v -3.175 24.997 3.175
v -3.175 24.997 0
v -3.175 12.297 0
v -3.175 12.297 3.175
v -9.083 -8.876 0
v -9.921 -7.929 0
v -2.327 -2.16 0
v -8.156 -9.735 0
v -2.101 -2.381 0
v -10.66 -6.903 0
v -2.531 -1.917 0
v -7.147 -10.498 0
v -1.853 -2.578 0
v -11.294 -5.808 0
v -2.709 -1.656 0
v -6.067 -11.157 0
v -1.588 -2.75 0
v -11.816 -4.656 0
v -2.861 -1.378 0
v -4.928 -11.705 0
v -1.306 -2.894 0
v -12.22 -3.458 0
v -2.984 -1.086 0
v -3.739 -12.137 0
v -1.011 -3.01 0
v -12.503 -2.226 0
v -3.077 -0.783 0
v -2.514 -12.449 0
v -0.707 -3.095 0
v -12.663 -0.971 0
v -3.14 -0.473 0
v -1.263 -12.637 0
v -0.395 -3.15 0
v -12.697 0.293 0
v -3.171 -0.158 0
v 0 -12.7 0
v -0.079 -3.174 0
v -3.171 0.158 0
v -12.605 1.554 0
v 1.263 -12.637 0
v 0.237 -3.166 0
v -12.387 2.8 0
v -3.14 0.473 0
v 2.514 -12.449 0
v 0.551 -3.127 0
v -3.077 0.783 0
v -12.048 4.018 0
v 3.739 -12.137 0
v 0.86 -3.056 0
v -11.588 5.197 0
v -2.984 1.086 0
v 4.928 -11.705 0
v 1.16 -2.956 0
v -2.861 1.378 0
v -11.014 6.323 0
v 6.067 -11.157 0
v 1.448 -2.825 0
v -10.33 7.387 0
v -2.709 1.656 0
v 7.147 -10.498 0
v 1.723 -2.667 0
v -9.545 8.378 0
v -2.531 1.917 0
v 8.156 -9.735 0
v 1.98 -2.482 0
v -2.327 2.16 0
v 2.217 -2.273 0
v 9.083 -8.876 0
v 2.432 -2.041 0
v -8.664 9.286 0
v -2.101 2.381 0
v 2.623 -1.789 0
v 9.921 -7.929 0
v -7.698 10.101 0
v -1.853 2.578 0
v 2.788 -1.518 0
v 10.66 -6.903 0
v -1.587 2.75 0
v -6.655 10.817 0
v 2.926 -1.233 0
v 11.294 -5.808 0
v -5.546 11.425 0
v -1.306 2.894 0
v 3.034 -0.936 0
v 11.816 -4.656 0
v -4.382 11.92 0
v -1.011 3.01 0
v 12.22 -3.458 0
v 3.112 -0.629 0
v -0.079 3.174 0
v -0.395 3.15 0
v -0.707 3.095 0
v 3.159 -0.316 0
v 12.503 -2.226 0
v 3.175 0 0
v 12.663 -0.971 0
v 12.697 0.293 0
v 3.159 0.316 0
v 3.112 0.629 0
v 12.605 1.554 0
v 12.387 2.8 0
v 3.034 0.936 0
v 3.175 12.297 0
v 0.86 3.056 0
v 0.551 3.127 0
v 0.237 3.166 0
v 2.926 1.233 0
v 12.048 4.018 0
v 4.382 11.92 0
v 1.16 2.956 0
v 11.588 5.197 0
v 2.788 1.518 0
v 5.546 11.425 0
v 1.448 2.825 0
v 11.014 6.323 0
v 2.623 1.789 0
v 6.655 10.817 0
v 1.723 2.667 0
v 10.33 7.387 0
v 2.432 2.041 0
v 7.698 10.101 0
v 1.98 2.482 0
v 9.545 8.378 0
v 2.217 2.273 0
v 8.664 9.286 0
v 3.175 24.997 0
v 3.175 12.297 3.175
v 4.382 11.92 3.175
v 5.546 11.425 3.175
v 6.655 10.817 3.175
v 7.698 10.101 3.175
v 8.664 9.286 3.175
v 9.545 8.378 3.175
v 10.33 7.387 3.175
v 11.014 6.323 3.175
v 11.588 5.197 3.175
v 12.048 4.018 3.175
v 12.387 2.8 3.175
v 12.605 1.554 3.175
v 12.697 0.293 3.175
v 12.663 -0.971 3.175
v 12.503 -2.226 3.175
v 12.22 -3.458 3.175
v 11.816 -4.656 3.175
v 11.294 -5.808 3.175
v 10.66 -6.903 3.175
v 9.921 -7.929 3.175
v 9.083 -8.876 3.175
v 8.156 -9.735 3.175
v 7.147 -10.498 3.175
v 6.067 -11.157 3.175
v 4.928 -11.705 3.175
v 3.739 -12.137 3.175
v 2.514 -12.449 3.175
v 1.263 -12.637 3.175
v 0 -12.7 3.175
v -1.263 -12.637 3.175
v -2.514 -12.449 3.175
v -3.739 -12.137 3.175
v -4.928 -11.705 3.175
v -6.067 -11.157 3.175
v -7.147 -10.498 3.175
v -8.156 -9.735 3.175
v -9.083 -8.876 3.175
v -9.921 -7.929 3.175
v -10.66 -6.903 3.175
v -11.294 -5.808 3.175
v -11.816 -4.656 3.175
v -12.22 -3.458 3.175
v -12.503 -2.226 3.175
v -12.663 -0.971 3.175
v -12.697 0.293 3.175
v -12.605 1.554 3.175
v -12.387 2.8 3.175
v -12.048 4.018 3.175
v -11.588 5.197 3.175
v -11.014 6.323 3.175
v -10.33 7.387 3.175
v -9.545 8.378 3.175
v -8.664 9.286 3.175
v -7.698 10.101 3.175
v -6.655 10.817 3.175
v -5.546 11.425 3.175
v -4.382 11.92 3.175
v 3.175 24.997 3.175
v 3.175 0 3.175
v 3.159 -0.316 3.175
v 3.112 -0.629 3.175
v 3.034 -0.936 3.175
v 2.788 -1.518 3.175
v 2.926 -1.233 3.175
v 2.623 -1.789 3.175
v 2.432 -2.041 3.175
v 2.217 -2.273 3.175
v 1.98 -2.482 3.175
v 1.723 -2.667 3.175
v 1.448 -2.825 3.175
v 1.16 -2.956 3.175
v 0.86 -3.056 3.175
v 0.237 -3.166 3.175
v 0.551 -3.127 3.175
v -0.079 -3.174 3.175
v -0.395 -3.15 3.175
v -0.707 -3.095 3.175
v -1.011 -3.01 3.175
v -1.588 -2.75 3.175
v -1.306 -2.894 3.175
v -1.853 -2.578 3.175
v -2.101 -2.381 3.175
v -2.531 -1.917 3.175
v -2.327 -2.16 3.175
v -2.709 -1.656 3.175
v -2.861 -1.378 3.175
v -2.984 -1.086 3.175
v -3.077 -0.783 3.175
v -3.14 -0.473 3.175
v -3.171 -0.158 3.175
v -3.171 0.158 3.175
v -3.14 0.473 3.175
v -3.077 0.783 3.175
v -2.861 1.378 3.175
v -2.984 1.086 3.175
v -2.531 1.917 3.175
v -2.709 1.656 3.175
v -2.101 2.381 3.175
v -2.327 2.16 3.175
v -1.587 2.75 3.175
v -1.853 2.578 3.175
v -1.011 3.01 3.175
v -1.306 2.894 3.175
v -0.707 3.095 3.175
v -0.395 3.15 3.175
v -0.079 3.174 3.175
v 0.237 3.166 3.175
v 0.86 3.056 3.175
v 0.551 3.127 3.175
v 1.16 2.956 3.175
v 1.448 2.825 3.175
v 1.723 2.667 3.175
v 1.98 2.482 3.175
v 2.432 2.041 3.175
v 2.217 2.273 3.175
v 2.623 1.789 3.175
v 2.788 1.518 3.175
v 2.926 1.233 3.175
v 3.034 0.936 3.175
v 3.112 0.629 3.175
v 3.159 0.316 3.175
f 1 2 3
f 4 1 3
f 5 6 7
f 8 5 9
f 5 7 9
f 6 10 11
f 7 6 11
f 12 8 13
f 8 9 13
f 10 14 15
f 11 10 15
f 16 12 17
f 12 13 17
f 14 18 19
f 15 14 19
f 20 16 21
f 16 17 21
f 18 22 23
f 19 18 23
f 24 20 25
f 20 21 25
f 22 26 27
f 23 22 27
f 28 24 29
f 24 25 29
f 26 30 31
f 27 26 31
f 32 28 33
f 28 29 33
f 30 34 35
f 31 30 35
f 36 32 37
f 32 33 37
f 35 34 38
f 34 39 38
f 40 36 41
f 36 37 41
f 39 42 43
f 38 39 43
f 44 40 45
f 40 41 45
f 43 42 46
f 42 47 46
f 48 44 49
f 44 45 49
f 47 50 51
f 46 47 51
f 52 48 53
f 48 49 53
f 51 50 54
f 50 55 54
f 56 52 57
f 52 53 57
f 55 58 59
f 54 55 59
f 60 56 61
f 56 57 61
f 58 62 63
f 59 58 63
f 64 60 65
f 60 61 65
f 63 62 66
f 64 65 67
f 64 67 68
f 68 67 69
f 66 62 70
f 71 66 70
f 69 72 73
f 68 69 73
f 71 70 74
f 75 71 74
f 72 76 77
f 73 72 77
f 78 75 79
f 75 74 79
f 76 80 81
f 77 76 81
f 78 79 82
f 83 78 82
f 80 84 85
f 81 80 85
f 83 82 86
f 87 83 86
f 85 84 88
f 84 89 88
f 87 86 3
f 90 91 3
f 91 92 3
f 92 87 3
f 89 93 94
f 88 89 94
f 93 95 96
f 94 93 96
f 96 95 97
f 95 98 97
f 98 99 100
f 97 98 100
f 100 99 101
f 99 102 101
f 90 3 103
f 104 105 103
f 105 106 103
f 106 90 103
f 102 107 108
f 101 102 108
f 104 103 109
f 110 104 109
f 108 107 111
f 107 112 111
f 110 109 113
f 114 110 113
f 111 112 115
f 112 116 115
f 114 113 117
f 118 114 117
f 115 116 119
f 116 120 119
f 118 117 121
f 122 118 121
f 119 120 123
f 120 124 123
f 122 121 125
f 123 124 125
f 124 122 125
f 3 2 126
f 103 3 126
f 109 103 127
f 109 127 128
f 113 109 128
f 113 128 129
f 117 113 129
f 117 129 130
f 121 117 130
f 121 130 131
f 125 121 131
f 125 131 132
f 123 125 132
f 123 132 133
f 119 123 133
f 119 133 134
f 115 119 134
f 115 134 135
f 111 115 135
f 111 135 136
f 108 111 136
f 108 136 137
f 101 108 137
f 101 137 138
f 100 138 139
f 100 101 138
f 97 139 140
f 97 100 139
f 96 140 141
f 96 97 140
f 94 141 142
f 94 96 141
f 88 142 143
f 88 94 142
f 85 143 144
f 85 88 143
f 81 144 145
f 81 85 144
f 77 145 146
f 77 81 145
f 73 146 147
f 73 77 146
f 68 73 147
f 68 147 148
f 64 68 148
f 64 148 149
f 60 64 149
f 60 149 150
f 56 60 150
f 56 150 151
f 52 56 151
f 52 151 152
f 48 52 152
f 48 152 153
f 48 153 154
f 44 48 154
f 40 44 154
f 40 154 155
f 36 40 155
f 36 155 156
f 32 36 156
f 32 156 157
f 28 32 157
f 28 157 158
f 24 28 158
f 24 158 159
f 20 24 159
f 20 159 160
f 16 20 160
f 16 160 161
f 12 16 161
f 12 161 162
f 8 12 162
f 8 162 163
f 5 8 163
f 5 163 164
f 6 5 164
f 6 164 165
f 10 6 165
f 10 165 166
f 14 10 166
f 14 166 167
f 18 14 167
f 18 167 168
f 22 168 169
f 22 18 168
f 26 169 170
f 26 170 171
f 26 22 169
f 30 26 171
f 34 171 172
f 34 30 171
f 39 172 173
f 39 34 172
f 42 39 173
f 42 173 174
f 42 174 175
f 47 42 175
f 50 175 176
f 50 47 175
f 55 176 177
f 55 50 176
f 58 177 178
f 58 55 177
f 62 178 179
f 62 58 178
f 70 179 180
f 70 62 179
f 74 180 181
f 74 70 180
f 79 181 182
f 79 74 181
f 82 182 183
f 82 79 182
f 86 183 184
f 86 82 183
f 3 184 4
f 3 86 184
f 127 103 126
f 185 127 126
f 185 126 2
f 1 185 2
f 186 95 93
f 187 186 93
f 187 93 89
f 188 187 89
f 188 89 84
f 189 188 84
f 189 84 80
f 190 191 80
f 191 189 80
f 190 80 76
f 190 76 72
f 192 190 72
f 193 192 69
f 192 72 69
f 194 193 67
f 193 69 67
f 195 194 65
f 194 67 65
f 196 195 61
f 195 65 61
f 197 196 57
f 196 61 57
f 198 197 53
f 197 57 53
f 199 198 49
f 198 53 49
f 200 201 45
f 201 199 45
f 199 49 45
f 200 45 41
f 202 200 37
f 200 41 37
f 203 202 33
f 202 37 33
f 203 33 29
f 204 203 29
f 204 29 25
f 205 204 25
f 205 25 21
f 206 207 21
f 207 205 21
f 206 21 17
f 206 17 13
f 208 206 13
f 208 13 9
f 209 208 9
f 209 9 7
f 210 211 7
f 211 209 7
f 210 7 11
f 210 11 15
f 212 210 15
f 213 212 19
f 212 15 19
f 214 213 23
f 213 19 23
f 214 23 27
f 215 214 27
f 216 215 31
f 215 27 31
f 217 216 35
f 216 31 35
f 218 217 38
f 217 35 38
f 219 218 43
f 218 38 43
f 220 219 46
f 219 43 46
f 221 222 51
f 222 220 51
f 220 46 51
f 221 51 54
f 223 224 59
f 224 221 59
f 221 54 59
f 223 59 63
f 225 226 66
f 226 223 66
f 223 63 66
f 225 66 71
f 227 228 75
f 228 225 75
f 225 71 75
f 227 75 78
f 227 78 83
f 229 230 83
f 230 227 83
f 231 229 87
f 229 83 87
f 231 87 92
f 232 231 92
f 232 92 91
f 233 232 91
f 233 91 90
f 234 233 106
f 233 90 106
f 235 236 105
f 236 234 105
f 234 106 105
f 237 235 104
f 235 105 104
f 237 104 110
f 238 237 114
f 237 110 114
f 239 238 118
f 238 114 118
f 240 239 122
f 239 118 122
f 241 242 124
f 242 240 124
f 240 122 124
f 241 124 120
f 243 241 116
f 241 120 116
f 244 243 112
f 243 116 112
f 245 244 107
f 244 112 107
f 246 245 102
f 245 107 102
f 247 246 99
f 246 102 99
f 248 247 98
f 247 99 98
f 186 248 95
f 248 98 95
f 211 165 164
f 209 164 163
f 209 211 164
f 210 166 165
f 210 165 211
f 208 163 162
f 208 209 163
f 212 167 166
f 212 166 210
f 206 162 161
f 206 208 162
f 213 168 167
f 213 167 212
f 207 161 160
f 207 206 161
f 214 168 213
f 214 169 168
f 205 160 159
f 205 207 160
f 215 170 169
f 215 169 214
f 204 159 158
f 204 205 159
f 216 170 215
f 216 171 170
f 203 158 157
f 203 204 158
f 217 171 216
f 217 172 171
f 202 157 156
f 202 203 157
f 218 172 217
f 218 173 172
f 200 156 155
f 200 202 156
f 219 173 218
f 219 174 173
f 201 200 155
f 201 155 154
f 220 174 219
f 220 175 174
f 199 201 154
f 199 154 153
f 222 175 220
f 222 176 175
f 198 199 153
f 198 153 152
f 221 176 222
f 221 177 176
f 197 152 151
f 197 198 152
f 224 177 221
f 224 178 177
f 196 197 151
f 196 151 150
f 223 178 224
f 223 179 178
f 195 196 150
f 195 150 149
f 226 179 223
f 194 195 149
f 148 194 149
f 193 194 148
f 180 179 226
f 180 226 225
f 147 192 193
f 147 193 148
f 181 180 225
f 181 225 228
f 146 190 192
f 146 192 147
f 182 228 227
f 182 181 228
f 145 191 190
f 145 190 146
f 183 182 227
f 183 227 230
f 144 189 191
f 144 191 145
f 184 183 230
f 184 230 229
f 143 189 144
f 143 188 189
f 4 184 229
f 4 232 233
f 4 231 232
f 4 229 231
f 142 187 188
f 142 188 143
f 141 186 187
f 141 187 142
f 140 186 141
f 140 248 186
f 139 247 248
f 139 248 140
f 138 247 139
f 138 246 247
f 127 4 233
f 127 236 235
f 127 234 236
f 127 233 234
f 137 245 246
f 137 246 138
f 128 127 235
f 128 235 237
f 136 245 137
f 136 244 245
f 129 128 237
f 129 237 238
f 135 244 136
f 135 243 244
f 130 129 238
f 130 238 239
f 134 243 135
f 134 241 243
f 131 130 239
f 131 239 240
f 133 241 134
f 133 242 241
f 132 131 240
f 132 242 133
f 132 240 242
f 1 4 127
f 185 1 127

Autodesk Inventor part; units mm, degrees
ref_plane "YZ Plane" through (0, 0, 0) normal (1, 0, 0) x (0, 1, 0)
ref_plane "XZ Plane" through (0, 0, 0) normal (0, 1, 0) x (-1, 0, 0)
ref_plane "XY Plane" through (0, 0, 0) normal (0, 0, 1) x (1, 0, 0)
sketch "Sketch1" plane through (0, 0, 0) normal (0, 0, 1) x (1, 0, 0)
  circle A0 centre (0, 0) radius 3.175
  circle A1 centre (0, 0) radius 12.7
  line L0 (-3.175, 12.2967) -> (3.175, 12.2967)
  line L1 (-3.175, 12.2967) -> (3.175, 12.2967)
  line L2 (3.175, 12.2967) -> (3.175, 24.9967)
  line L3 (3.175, 24.9967) -> (-3.175, 24.9967)
  line L4 (-3.175, 24.9967) -> (-3.175, 12.2967)
  dimension "d0" = 6.35
  dimension "d1" = 25.4
  dimension "d2" = 6.35
  dimension "d3" = 12.7
  dimension "d4" = 6.35
extrude "Extrusion1" add sketch "Sketch1" along normal blind 3.175
properties part number "spinnything"
